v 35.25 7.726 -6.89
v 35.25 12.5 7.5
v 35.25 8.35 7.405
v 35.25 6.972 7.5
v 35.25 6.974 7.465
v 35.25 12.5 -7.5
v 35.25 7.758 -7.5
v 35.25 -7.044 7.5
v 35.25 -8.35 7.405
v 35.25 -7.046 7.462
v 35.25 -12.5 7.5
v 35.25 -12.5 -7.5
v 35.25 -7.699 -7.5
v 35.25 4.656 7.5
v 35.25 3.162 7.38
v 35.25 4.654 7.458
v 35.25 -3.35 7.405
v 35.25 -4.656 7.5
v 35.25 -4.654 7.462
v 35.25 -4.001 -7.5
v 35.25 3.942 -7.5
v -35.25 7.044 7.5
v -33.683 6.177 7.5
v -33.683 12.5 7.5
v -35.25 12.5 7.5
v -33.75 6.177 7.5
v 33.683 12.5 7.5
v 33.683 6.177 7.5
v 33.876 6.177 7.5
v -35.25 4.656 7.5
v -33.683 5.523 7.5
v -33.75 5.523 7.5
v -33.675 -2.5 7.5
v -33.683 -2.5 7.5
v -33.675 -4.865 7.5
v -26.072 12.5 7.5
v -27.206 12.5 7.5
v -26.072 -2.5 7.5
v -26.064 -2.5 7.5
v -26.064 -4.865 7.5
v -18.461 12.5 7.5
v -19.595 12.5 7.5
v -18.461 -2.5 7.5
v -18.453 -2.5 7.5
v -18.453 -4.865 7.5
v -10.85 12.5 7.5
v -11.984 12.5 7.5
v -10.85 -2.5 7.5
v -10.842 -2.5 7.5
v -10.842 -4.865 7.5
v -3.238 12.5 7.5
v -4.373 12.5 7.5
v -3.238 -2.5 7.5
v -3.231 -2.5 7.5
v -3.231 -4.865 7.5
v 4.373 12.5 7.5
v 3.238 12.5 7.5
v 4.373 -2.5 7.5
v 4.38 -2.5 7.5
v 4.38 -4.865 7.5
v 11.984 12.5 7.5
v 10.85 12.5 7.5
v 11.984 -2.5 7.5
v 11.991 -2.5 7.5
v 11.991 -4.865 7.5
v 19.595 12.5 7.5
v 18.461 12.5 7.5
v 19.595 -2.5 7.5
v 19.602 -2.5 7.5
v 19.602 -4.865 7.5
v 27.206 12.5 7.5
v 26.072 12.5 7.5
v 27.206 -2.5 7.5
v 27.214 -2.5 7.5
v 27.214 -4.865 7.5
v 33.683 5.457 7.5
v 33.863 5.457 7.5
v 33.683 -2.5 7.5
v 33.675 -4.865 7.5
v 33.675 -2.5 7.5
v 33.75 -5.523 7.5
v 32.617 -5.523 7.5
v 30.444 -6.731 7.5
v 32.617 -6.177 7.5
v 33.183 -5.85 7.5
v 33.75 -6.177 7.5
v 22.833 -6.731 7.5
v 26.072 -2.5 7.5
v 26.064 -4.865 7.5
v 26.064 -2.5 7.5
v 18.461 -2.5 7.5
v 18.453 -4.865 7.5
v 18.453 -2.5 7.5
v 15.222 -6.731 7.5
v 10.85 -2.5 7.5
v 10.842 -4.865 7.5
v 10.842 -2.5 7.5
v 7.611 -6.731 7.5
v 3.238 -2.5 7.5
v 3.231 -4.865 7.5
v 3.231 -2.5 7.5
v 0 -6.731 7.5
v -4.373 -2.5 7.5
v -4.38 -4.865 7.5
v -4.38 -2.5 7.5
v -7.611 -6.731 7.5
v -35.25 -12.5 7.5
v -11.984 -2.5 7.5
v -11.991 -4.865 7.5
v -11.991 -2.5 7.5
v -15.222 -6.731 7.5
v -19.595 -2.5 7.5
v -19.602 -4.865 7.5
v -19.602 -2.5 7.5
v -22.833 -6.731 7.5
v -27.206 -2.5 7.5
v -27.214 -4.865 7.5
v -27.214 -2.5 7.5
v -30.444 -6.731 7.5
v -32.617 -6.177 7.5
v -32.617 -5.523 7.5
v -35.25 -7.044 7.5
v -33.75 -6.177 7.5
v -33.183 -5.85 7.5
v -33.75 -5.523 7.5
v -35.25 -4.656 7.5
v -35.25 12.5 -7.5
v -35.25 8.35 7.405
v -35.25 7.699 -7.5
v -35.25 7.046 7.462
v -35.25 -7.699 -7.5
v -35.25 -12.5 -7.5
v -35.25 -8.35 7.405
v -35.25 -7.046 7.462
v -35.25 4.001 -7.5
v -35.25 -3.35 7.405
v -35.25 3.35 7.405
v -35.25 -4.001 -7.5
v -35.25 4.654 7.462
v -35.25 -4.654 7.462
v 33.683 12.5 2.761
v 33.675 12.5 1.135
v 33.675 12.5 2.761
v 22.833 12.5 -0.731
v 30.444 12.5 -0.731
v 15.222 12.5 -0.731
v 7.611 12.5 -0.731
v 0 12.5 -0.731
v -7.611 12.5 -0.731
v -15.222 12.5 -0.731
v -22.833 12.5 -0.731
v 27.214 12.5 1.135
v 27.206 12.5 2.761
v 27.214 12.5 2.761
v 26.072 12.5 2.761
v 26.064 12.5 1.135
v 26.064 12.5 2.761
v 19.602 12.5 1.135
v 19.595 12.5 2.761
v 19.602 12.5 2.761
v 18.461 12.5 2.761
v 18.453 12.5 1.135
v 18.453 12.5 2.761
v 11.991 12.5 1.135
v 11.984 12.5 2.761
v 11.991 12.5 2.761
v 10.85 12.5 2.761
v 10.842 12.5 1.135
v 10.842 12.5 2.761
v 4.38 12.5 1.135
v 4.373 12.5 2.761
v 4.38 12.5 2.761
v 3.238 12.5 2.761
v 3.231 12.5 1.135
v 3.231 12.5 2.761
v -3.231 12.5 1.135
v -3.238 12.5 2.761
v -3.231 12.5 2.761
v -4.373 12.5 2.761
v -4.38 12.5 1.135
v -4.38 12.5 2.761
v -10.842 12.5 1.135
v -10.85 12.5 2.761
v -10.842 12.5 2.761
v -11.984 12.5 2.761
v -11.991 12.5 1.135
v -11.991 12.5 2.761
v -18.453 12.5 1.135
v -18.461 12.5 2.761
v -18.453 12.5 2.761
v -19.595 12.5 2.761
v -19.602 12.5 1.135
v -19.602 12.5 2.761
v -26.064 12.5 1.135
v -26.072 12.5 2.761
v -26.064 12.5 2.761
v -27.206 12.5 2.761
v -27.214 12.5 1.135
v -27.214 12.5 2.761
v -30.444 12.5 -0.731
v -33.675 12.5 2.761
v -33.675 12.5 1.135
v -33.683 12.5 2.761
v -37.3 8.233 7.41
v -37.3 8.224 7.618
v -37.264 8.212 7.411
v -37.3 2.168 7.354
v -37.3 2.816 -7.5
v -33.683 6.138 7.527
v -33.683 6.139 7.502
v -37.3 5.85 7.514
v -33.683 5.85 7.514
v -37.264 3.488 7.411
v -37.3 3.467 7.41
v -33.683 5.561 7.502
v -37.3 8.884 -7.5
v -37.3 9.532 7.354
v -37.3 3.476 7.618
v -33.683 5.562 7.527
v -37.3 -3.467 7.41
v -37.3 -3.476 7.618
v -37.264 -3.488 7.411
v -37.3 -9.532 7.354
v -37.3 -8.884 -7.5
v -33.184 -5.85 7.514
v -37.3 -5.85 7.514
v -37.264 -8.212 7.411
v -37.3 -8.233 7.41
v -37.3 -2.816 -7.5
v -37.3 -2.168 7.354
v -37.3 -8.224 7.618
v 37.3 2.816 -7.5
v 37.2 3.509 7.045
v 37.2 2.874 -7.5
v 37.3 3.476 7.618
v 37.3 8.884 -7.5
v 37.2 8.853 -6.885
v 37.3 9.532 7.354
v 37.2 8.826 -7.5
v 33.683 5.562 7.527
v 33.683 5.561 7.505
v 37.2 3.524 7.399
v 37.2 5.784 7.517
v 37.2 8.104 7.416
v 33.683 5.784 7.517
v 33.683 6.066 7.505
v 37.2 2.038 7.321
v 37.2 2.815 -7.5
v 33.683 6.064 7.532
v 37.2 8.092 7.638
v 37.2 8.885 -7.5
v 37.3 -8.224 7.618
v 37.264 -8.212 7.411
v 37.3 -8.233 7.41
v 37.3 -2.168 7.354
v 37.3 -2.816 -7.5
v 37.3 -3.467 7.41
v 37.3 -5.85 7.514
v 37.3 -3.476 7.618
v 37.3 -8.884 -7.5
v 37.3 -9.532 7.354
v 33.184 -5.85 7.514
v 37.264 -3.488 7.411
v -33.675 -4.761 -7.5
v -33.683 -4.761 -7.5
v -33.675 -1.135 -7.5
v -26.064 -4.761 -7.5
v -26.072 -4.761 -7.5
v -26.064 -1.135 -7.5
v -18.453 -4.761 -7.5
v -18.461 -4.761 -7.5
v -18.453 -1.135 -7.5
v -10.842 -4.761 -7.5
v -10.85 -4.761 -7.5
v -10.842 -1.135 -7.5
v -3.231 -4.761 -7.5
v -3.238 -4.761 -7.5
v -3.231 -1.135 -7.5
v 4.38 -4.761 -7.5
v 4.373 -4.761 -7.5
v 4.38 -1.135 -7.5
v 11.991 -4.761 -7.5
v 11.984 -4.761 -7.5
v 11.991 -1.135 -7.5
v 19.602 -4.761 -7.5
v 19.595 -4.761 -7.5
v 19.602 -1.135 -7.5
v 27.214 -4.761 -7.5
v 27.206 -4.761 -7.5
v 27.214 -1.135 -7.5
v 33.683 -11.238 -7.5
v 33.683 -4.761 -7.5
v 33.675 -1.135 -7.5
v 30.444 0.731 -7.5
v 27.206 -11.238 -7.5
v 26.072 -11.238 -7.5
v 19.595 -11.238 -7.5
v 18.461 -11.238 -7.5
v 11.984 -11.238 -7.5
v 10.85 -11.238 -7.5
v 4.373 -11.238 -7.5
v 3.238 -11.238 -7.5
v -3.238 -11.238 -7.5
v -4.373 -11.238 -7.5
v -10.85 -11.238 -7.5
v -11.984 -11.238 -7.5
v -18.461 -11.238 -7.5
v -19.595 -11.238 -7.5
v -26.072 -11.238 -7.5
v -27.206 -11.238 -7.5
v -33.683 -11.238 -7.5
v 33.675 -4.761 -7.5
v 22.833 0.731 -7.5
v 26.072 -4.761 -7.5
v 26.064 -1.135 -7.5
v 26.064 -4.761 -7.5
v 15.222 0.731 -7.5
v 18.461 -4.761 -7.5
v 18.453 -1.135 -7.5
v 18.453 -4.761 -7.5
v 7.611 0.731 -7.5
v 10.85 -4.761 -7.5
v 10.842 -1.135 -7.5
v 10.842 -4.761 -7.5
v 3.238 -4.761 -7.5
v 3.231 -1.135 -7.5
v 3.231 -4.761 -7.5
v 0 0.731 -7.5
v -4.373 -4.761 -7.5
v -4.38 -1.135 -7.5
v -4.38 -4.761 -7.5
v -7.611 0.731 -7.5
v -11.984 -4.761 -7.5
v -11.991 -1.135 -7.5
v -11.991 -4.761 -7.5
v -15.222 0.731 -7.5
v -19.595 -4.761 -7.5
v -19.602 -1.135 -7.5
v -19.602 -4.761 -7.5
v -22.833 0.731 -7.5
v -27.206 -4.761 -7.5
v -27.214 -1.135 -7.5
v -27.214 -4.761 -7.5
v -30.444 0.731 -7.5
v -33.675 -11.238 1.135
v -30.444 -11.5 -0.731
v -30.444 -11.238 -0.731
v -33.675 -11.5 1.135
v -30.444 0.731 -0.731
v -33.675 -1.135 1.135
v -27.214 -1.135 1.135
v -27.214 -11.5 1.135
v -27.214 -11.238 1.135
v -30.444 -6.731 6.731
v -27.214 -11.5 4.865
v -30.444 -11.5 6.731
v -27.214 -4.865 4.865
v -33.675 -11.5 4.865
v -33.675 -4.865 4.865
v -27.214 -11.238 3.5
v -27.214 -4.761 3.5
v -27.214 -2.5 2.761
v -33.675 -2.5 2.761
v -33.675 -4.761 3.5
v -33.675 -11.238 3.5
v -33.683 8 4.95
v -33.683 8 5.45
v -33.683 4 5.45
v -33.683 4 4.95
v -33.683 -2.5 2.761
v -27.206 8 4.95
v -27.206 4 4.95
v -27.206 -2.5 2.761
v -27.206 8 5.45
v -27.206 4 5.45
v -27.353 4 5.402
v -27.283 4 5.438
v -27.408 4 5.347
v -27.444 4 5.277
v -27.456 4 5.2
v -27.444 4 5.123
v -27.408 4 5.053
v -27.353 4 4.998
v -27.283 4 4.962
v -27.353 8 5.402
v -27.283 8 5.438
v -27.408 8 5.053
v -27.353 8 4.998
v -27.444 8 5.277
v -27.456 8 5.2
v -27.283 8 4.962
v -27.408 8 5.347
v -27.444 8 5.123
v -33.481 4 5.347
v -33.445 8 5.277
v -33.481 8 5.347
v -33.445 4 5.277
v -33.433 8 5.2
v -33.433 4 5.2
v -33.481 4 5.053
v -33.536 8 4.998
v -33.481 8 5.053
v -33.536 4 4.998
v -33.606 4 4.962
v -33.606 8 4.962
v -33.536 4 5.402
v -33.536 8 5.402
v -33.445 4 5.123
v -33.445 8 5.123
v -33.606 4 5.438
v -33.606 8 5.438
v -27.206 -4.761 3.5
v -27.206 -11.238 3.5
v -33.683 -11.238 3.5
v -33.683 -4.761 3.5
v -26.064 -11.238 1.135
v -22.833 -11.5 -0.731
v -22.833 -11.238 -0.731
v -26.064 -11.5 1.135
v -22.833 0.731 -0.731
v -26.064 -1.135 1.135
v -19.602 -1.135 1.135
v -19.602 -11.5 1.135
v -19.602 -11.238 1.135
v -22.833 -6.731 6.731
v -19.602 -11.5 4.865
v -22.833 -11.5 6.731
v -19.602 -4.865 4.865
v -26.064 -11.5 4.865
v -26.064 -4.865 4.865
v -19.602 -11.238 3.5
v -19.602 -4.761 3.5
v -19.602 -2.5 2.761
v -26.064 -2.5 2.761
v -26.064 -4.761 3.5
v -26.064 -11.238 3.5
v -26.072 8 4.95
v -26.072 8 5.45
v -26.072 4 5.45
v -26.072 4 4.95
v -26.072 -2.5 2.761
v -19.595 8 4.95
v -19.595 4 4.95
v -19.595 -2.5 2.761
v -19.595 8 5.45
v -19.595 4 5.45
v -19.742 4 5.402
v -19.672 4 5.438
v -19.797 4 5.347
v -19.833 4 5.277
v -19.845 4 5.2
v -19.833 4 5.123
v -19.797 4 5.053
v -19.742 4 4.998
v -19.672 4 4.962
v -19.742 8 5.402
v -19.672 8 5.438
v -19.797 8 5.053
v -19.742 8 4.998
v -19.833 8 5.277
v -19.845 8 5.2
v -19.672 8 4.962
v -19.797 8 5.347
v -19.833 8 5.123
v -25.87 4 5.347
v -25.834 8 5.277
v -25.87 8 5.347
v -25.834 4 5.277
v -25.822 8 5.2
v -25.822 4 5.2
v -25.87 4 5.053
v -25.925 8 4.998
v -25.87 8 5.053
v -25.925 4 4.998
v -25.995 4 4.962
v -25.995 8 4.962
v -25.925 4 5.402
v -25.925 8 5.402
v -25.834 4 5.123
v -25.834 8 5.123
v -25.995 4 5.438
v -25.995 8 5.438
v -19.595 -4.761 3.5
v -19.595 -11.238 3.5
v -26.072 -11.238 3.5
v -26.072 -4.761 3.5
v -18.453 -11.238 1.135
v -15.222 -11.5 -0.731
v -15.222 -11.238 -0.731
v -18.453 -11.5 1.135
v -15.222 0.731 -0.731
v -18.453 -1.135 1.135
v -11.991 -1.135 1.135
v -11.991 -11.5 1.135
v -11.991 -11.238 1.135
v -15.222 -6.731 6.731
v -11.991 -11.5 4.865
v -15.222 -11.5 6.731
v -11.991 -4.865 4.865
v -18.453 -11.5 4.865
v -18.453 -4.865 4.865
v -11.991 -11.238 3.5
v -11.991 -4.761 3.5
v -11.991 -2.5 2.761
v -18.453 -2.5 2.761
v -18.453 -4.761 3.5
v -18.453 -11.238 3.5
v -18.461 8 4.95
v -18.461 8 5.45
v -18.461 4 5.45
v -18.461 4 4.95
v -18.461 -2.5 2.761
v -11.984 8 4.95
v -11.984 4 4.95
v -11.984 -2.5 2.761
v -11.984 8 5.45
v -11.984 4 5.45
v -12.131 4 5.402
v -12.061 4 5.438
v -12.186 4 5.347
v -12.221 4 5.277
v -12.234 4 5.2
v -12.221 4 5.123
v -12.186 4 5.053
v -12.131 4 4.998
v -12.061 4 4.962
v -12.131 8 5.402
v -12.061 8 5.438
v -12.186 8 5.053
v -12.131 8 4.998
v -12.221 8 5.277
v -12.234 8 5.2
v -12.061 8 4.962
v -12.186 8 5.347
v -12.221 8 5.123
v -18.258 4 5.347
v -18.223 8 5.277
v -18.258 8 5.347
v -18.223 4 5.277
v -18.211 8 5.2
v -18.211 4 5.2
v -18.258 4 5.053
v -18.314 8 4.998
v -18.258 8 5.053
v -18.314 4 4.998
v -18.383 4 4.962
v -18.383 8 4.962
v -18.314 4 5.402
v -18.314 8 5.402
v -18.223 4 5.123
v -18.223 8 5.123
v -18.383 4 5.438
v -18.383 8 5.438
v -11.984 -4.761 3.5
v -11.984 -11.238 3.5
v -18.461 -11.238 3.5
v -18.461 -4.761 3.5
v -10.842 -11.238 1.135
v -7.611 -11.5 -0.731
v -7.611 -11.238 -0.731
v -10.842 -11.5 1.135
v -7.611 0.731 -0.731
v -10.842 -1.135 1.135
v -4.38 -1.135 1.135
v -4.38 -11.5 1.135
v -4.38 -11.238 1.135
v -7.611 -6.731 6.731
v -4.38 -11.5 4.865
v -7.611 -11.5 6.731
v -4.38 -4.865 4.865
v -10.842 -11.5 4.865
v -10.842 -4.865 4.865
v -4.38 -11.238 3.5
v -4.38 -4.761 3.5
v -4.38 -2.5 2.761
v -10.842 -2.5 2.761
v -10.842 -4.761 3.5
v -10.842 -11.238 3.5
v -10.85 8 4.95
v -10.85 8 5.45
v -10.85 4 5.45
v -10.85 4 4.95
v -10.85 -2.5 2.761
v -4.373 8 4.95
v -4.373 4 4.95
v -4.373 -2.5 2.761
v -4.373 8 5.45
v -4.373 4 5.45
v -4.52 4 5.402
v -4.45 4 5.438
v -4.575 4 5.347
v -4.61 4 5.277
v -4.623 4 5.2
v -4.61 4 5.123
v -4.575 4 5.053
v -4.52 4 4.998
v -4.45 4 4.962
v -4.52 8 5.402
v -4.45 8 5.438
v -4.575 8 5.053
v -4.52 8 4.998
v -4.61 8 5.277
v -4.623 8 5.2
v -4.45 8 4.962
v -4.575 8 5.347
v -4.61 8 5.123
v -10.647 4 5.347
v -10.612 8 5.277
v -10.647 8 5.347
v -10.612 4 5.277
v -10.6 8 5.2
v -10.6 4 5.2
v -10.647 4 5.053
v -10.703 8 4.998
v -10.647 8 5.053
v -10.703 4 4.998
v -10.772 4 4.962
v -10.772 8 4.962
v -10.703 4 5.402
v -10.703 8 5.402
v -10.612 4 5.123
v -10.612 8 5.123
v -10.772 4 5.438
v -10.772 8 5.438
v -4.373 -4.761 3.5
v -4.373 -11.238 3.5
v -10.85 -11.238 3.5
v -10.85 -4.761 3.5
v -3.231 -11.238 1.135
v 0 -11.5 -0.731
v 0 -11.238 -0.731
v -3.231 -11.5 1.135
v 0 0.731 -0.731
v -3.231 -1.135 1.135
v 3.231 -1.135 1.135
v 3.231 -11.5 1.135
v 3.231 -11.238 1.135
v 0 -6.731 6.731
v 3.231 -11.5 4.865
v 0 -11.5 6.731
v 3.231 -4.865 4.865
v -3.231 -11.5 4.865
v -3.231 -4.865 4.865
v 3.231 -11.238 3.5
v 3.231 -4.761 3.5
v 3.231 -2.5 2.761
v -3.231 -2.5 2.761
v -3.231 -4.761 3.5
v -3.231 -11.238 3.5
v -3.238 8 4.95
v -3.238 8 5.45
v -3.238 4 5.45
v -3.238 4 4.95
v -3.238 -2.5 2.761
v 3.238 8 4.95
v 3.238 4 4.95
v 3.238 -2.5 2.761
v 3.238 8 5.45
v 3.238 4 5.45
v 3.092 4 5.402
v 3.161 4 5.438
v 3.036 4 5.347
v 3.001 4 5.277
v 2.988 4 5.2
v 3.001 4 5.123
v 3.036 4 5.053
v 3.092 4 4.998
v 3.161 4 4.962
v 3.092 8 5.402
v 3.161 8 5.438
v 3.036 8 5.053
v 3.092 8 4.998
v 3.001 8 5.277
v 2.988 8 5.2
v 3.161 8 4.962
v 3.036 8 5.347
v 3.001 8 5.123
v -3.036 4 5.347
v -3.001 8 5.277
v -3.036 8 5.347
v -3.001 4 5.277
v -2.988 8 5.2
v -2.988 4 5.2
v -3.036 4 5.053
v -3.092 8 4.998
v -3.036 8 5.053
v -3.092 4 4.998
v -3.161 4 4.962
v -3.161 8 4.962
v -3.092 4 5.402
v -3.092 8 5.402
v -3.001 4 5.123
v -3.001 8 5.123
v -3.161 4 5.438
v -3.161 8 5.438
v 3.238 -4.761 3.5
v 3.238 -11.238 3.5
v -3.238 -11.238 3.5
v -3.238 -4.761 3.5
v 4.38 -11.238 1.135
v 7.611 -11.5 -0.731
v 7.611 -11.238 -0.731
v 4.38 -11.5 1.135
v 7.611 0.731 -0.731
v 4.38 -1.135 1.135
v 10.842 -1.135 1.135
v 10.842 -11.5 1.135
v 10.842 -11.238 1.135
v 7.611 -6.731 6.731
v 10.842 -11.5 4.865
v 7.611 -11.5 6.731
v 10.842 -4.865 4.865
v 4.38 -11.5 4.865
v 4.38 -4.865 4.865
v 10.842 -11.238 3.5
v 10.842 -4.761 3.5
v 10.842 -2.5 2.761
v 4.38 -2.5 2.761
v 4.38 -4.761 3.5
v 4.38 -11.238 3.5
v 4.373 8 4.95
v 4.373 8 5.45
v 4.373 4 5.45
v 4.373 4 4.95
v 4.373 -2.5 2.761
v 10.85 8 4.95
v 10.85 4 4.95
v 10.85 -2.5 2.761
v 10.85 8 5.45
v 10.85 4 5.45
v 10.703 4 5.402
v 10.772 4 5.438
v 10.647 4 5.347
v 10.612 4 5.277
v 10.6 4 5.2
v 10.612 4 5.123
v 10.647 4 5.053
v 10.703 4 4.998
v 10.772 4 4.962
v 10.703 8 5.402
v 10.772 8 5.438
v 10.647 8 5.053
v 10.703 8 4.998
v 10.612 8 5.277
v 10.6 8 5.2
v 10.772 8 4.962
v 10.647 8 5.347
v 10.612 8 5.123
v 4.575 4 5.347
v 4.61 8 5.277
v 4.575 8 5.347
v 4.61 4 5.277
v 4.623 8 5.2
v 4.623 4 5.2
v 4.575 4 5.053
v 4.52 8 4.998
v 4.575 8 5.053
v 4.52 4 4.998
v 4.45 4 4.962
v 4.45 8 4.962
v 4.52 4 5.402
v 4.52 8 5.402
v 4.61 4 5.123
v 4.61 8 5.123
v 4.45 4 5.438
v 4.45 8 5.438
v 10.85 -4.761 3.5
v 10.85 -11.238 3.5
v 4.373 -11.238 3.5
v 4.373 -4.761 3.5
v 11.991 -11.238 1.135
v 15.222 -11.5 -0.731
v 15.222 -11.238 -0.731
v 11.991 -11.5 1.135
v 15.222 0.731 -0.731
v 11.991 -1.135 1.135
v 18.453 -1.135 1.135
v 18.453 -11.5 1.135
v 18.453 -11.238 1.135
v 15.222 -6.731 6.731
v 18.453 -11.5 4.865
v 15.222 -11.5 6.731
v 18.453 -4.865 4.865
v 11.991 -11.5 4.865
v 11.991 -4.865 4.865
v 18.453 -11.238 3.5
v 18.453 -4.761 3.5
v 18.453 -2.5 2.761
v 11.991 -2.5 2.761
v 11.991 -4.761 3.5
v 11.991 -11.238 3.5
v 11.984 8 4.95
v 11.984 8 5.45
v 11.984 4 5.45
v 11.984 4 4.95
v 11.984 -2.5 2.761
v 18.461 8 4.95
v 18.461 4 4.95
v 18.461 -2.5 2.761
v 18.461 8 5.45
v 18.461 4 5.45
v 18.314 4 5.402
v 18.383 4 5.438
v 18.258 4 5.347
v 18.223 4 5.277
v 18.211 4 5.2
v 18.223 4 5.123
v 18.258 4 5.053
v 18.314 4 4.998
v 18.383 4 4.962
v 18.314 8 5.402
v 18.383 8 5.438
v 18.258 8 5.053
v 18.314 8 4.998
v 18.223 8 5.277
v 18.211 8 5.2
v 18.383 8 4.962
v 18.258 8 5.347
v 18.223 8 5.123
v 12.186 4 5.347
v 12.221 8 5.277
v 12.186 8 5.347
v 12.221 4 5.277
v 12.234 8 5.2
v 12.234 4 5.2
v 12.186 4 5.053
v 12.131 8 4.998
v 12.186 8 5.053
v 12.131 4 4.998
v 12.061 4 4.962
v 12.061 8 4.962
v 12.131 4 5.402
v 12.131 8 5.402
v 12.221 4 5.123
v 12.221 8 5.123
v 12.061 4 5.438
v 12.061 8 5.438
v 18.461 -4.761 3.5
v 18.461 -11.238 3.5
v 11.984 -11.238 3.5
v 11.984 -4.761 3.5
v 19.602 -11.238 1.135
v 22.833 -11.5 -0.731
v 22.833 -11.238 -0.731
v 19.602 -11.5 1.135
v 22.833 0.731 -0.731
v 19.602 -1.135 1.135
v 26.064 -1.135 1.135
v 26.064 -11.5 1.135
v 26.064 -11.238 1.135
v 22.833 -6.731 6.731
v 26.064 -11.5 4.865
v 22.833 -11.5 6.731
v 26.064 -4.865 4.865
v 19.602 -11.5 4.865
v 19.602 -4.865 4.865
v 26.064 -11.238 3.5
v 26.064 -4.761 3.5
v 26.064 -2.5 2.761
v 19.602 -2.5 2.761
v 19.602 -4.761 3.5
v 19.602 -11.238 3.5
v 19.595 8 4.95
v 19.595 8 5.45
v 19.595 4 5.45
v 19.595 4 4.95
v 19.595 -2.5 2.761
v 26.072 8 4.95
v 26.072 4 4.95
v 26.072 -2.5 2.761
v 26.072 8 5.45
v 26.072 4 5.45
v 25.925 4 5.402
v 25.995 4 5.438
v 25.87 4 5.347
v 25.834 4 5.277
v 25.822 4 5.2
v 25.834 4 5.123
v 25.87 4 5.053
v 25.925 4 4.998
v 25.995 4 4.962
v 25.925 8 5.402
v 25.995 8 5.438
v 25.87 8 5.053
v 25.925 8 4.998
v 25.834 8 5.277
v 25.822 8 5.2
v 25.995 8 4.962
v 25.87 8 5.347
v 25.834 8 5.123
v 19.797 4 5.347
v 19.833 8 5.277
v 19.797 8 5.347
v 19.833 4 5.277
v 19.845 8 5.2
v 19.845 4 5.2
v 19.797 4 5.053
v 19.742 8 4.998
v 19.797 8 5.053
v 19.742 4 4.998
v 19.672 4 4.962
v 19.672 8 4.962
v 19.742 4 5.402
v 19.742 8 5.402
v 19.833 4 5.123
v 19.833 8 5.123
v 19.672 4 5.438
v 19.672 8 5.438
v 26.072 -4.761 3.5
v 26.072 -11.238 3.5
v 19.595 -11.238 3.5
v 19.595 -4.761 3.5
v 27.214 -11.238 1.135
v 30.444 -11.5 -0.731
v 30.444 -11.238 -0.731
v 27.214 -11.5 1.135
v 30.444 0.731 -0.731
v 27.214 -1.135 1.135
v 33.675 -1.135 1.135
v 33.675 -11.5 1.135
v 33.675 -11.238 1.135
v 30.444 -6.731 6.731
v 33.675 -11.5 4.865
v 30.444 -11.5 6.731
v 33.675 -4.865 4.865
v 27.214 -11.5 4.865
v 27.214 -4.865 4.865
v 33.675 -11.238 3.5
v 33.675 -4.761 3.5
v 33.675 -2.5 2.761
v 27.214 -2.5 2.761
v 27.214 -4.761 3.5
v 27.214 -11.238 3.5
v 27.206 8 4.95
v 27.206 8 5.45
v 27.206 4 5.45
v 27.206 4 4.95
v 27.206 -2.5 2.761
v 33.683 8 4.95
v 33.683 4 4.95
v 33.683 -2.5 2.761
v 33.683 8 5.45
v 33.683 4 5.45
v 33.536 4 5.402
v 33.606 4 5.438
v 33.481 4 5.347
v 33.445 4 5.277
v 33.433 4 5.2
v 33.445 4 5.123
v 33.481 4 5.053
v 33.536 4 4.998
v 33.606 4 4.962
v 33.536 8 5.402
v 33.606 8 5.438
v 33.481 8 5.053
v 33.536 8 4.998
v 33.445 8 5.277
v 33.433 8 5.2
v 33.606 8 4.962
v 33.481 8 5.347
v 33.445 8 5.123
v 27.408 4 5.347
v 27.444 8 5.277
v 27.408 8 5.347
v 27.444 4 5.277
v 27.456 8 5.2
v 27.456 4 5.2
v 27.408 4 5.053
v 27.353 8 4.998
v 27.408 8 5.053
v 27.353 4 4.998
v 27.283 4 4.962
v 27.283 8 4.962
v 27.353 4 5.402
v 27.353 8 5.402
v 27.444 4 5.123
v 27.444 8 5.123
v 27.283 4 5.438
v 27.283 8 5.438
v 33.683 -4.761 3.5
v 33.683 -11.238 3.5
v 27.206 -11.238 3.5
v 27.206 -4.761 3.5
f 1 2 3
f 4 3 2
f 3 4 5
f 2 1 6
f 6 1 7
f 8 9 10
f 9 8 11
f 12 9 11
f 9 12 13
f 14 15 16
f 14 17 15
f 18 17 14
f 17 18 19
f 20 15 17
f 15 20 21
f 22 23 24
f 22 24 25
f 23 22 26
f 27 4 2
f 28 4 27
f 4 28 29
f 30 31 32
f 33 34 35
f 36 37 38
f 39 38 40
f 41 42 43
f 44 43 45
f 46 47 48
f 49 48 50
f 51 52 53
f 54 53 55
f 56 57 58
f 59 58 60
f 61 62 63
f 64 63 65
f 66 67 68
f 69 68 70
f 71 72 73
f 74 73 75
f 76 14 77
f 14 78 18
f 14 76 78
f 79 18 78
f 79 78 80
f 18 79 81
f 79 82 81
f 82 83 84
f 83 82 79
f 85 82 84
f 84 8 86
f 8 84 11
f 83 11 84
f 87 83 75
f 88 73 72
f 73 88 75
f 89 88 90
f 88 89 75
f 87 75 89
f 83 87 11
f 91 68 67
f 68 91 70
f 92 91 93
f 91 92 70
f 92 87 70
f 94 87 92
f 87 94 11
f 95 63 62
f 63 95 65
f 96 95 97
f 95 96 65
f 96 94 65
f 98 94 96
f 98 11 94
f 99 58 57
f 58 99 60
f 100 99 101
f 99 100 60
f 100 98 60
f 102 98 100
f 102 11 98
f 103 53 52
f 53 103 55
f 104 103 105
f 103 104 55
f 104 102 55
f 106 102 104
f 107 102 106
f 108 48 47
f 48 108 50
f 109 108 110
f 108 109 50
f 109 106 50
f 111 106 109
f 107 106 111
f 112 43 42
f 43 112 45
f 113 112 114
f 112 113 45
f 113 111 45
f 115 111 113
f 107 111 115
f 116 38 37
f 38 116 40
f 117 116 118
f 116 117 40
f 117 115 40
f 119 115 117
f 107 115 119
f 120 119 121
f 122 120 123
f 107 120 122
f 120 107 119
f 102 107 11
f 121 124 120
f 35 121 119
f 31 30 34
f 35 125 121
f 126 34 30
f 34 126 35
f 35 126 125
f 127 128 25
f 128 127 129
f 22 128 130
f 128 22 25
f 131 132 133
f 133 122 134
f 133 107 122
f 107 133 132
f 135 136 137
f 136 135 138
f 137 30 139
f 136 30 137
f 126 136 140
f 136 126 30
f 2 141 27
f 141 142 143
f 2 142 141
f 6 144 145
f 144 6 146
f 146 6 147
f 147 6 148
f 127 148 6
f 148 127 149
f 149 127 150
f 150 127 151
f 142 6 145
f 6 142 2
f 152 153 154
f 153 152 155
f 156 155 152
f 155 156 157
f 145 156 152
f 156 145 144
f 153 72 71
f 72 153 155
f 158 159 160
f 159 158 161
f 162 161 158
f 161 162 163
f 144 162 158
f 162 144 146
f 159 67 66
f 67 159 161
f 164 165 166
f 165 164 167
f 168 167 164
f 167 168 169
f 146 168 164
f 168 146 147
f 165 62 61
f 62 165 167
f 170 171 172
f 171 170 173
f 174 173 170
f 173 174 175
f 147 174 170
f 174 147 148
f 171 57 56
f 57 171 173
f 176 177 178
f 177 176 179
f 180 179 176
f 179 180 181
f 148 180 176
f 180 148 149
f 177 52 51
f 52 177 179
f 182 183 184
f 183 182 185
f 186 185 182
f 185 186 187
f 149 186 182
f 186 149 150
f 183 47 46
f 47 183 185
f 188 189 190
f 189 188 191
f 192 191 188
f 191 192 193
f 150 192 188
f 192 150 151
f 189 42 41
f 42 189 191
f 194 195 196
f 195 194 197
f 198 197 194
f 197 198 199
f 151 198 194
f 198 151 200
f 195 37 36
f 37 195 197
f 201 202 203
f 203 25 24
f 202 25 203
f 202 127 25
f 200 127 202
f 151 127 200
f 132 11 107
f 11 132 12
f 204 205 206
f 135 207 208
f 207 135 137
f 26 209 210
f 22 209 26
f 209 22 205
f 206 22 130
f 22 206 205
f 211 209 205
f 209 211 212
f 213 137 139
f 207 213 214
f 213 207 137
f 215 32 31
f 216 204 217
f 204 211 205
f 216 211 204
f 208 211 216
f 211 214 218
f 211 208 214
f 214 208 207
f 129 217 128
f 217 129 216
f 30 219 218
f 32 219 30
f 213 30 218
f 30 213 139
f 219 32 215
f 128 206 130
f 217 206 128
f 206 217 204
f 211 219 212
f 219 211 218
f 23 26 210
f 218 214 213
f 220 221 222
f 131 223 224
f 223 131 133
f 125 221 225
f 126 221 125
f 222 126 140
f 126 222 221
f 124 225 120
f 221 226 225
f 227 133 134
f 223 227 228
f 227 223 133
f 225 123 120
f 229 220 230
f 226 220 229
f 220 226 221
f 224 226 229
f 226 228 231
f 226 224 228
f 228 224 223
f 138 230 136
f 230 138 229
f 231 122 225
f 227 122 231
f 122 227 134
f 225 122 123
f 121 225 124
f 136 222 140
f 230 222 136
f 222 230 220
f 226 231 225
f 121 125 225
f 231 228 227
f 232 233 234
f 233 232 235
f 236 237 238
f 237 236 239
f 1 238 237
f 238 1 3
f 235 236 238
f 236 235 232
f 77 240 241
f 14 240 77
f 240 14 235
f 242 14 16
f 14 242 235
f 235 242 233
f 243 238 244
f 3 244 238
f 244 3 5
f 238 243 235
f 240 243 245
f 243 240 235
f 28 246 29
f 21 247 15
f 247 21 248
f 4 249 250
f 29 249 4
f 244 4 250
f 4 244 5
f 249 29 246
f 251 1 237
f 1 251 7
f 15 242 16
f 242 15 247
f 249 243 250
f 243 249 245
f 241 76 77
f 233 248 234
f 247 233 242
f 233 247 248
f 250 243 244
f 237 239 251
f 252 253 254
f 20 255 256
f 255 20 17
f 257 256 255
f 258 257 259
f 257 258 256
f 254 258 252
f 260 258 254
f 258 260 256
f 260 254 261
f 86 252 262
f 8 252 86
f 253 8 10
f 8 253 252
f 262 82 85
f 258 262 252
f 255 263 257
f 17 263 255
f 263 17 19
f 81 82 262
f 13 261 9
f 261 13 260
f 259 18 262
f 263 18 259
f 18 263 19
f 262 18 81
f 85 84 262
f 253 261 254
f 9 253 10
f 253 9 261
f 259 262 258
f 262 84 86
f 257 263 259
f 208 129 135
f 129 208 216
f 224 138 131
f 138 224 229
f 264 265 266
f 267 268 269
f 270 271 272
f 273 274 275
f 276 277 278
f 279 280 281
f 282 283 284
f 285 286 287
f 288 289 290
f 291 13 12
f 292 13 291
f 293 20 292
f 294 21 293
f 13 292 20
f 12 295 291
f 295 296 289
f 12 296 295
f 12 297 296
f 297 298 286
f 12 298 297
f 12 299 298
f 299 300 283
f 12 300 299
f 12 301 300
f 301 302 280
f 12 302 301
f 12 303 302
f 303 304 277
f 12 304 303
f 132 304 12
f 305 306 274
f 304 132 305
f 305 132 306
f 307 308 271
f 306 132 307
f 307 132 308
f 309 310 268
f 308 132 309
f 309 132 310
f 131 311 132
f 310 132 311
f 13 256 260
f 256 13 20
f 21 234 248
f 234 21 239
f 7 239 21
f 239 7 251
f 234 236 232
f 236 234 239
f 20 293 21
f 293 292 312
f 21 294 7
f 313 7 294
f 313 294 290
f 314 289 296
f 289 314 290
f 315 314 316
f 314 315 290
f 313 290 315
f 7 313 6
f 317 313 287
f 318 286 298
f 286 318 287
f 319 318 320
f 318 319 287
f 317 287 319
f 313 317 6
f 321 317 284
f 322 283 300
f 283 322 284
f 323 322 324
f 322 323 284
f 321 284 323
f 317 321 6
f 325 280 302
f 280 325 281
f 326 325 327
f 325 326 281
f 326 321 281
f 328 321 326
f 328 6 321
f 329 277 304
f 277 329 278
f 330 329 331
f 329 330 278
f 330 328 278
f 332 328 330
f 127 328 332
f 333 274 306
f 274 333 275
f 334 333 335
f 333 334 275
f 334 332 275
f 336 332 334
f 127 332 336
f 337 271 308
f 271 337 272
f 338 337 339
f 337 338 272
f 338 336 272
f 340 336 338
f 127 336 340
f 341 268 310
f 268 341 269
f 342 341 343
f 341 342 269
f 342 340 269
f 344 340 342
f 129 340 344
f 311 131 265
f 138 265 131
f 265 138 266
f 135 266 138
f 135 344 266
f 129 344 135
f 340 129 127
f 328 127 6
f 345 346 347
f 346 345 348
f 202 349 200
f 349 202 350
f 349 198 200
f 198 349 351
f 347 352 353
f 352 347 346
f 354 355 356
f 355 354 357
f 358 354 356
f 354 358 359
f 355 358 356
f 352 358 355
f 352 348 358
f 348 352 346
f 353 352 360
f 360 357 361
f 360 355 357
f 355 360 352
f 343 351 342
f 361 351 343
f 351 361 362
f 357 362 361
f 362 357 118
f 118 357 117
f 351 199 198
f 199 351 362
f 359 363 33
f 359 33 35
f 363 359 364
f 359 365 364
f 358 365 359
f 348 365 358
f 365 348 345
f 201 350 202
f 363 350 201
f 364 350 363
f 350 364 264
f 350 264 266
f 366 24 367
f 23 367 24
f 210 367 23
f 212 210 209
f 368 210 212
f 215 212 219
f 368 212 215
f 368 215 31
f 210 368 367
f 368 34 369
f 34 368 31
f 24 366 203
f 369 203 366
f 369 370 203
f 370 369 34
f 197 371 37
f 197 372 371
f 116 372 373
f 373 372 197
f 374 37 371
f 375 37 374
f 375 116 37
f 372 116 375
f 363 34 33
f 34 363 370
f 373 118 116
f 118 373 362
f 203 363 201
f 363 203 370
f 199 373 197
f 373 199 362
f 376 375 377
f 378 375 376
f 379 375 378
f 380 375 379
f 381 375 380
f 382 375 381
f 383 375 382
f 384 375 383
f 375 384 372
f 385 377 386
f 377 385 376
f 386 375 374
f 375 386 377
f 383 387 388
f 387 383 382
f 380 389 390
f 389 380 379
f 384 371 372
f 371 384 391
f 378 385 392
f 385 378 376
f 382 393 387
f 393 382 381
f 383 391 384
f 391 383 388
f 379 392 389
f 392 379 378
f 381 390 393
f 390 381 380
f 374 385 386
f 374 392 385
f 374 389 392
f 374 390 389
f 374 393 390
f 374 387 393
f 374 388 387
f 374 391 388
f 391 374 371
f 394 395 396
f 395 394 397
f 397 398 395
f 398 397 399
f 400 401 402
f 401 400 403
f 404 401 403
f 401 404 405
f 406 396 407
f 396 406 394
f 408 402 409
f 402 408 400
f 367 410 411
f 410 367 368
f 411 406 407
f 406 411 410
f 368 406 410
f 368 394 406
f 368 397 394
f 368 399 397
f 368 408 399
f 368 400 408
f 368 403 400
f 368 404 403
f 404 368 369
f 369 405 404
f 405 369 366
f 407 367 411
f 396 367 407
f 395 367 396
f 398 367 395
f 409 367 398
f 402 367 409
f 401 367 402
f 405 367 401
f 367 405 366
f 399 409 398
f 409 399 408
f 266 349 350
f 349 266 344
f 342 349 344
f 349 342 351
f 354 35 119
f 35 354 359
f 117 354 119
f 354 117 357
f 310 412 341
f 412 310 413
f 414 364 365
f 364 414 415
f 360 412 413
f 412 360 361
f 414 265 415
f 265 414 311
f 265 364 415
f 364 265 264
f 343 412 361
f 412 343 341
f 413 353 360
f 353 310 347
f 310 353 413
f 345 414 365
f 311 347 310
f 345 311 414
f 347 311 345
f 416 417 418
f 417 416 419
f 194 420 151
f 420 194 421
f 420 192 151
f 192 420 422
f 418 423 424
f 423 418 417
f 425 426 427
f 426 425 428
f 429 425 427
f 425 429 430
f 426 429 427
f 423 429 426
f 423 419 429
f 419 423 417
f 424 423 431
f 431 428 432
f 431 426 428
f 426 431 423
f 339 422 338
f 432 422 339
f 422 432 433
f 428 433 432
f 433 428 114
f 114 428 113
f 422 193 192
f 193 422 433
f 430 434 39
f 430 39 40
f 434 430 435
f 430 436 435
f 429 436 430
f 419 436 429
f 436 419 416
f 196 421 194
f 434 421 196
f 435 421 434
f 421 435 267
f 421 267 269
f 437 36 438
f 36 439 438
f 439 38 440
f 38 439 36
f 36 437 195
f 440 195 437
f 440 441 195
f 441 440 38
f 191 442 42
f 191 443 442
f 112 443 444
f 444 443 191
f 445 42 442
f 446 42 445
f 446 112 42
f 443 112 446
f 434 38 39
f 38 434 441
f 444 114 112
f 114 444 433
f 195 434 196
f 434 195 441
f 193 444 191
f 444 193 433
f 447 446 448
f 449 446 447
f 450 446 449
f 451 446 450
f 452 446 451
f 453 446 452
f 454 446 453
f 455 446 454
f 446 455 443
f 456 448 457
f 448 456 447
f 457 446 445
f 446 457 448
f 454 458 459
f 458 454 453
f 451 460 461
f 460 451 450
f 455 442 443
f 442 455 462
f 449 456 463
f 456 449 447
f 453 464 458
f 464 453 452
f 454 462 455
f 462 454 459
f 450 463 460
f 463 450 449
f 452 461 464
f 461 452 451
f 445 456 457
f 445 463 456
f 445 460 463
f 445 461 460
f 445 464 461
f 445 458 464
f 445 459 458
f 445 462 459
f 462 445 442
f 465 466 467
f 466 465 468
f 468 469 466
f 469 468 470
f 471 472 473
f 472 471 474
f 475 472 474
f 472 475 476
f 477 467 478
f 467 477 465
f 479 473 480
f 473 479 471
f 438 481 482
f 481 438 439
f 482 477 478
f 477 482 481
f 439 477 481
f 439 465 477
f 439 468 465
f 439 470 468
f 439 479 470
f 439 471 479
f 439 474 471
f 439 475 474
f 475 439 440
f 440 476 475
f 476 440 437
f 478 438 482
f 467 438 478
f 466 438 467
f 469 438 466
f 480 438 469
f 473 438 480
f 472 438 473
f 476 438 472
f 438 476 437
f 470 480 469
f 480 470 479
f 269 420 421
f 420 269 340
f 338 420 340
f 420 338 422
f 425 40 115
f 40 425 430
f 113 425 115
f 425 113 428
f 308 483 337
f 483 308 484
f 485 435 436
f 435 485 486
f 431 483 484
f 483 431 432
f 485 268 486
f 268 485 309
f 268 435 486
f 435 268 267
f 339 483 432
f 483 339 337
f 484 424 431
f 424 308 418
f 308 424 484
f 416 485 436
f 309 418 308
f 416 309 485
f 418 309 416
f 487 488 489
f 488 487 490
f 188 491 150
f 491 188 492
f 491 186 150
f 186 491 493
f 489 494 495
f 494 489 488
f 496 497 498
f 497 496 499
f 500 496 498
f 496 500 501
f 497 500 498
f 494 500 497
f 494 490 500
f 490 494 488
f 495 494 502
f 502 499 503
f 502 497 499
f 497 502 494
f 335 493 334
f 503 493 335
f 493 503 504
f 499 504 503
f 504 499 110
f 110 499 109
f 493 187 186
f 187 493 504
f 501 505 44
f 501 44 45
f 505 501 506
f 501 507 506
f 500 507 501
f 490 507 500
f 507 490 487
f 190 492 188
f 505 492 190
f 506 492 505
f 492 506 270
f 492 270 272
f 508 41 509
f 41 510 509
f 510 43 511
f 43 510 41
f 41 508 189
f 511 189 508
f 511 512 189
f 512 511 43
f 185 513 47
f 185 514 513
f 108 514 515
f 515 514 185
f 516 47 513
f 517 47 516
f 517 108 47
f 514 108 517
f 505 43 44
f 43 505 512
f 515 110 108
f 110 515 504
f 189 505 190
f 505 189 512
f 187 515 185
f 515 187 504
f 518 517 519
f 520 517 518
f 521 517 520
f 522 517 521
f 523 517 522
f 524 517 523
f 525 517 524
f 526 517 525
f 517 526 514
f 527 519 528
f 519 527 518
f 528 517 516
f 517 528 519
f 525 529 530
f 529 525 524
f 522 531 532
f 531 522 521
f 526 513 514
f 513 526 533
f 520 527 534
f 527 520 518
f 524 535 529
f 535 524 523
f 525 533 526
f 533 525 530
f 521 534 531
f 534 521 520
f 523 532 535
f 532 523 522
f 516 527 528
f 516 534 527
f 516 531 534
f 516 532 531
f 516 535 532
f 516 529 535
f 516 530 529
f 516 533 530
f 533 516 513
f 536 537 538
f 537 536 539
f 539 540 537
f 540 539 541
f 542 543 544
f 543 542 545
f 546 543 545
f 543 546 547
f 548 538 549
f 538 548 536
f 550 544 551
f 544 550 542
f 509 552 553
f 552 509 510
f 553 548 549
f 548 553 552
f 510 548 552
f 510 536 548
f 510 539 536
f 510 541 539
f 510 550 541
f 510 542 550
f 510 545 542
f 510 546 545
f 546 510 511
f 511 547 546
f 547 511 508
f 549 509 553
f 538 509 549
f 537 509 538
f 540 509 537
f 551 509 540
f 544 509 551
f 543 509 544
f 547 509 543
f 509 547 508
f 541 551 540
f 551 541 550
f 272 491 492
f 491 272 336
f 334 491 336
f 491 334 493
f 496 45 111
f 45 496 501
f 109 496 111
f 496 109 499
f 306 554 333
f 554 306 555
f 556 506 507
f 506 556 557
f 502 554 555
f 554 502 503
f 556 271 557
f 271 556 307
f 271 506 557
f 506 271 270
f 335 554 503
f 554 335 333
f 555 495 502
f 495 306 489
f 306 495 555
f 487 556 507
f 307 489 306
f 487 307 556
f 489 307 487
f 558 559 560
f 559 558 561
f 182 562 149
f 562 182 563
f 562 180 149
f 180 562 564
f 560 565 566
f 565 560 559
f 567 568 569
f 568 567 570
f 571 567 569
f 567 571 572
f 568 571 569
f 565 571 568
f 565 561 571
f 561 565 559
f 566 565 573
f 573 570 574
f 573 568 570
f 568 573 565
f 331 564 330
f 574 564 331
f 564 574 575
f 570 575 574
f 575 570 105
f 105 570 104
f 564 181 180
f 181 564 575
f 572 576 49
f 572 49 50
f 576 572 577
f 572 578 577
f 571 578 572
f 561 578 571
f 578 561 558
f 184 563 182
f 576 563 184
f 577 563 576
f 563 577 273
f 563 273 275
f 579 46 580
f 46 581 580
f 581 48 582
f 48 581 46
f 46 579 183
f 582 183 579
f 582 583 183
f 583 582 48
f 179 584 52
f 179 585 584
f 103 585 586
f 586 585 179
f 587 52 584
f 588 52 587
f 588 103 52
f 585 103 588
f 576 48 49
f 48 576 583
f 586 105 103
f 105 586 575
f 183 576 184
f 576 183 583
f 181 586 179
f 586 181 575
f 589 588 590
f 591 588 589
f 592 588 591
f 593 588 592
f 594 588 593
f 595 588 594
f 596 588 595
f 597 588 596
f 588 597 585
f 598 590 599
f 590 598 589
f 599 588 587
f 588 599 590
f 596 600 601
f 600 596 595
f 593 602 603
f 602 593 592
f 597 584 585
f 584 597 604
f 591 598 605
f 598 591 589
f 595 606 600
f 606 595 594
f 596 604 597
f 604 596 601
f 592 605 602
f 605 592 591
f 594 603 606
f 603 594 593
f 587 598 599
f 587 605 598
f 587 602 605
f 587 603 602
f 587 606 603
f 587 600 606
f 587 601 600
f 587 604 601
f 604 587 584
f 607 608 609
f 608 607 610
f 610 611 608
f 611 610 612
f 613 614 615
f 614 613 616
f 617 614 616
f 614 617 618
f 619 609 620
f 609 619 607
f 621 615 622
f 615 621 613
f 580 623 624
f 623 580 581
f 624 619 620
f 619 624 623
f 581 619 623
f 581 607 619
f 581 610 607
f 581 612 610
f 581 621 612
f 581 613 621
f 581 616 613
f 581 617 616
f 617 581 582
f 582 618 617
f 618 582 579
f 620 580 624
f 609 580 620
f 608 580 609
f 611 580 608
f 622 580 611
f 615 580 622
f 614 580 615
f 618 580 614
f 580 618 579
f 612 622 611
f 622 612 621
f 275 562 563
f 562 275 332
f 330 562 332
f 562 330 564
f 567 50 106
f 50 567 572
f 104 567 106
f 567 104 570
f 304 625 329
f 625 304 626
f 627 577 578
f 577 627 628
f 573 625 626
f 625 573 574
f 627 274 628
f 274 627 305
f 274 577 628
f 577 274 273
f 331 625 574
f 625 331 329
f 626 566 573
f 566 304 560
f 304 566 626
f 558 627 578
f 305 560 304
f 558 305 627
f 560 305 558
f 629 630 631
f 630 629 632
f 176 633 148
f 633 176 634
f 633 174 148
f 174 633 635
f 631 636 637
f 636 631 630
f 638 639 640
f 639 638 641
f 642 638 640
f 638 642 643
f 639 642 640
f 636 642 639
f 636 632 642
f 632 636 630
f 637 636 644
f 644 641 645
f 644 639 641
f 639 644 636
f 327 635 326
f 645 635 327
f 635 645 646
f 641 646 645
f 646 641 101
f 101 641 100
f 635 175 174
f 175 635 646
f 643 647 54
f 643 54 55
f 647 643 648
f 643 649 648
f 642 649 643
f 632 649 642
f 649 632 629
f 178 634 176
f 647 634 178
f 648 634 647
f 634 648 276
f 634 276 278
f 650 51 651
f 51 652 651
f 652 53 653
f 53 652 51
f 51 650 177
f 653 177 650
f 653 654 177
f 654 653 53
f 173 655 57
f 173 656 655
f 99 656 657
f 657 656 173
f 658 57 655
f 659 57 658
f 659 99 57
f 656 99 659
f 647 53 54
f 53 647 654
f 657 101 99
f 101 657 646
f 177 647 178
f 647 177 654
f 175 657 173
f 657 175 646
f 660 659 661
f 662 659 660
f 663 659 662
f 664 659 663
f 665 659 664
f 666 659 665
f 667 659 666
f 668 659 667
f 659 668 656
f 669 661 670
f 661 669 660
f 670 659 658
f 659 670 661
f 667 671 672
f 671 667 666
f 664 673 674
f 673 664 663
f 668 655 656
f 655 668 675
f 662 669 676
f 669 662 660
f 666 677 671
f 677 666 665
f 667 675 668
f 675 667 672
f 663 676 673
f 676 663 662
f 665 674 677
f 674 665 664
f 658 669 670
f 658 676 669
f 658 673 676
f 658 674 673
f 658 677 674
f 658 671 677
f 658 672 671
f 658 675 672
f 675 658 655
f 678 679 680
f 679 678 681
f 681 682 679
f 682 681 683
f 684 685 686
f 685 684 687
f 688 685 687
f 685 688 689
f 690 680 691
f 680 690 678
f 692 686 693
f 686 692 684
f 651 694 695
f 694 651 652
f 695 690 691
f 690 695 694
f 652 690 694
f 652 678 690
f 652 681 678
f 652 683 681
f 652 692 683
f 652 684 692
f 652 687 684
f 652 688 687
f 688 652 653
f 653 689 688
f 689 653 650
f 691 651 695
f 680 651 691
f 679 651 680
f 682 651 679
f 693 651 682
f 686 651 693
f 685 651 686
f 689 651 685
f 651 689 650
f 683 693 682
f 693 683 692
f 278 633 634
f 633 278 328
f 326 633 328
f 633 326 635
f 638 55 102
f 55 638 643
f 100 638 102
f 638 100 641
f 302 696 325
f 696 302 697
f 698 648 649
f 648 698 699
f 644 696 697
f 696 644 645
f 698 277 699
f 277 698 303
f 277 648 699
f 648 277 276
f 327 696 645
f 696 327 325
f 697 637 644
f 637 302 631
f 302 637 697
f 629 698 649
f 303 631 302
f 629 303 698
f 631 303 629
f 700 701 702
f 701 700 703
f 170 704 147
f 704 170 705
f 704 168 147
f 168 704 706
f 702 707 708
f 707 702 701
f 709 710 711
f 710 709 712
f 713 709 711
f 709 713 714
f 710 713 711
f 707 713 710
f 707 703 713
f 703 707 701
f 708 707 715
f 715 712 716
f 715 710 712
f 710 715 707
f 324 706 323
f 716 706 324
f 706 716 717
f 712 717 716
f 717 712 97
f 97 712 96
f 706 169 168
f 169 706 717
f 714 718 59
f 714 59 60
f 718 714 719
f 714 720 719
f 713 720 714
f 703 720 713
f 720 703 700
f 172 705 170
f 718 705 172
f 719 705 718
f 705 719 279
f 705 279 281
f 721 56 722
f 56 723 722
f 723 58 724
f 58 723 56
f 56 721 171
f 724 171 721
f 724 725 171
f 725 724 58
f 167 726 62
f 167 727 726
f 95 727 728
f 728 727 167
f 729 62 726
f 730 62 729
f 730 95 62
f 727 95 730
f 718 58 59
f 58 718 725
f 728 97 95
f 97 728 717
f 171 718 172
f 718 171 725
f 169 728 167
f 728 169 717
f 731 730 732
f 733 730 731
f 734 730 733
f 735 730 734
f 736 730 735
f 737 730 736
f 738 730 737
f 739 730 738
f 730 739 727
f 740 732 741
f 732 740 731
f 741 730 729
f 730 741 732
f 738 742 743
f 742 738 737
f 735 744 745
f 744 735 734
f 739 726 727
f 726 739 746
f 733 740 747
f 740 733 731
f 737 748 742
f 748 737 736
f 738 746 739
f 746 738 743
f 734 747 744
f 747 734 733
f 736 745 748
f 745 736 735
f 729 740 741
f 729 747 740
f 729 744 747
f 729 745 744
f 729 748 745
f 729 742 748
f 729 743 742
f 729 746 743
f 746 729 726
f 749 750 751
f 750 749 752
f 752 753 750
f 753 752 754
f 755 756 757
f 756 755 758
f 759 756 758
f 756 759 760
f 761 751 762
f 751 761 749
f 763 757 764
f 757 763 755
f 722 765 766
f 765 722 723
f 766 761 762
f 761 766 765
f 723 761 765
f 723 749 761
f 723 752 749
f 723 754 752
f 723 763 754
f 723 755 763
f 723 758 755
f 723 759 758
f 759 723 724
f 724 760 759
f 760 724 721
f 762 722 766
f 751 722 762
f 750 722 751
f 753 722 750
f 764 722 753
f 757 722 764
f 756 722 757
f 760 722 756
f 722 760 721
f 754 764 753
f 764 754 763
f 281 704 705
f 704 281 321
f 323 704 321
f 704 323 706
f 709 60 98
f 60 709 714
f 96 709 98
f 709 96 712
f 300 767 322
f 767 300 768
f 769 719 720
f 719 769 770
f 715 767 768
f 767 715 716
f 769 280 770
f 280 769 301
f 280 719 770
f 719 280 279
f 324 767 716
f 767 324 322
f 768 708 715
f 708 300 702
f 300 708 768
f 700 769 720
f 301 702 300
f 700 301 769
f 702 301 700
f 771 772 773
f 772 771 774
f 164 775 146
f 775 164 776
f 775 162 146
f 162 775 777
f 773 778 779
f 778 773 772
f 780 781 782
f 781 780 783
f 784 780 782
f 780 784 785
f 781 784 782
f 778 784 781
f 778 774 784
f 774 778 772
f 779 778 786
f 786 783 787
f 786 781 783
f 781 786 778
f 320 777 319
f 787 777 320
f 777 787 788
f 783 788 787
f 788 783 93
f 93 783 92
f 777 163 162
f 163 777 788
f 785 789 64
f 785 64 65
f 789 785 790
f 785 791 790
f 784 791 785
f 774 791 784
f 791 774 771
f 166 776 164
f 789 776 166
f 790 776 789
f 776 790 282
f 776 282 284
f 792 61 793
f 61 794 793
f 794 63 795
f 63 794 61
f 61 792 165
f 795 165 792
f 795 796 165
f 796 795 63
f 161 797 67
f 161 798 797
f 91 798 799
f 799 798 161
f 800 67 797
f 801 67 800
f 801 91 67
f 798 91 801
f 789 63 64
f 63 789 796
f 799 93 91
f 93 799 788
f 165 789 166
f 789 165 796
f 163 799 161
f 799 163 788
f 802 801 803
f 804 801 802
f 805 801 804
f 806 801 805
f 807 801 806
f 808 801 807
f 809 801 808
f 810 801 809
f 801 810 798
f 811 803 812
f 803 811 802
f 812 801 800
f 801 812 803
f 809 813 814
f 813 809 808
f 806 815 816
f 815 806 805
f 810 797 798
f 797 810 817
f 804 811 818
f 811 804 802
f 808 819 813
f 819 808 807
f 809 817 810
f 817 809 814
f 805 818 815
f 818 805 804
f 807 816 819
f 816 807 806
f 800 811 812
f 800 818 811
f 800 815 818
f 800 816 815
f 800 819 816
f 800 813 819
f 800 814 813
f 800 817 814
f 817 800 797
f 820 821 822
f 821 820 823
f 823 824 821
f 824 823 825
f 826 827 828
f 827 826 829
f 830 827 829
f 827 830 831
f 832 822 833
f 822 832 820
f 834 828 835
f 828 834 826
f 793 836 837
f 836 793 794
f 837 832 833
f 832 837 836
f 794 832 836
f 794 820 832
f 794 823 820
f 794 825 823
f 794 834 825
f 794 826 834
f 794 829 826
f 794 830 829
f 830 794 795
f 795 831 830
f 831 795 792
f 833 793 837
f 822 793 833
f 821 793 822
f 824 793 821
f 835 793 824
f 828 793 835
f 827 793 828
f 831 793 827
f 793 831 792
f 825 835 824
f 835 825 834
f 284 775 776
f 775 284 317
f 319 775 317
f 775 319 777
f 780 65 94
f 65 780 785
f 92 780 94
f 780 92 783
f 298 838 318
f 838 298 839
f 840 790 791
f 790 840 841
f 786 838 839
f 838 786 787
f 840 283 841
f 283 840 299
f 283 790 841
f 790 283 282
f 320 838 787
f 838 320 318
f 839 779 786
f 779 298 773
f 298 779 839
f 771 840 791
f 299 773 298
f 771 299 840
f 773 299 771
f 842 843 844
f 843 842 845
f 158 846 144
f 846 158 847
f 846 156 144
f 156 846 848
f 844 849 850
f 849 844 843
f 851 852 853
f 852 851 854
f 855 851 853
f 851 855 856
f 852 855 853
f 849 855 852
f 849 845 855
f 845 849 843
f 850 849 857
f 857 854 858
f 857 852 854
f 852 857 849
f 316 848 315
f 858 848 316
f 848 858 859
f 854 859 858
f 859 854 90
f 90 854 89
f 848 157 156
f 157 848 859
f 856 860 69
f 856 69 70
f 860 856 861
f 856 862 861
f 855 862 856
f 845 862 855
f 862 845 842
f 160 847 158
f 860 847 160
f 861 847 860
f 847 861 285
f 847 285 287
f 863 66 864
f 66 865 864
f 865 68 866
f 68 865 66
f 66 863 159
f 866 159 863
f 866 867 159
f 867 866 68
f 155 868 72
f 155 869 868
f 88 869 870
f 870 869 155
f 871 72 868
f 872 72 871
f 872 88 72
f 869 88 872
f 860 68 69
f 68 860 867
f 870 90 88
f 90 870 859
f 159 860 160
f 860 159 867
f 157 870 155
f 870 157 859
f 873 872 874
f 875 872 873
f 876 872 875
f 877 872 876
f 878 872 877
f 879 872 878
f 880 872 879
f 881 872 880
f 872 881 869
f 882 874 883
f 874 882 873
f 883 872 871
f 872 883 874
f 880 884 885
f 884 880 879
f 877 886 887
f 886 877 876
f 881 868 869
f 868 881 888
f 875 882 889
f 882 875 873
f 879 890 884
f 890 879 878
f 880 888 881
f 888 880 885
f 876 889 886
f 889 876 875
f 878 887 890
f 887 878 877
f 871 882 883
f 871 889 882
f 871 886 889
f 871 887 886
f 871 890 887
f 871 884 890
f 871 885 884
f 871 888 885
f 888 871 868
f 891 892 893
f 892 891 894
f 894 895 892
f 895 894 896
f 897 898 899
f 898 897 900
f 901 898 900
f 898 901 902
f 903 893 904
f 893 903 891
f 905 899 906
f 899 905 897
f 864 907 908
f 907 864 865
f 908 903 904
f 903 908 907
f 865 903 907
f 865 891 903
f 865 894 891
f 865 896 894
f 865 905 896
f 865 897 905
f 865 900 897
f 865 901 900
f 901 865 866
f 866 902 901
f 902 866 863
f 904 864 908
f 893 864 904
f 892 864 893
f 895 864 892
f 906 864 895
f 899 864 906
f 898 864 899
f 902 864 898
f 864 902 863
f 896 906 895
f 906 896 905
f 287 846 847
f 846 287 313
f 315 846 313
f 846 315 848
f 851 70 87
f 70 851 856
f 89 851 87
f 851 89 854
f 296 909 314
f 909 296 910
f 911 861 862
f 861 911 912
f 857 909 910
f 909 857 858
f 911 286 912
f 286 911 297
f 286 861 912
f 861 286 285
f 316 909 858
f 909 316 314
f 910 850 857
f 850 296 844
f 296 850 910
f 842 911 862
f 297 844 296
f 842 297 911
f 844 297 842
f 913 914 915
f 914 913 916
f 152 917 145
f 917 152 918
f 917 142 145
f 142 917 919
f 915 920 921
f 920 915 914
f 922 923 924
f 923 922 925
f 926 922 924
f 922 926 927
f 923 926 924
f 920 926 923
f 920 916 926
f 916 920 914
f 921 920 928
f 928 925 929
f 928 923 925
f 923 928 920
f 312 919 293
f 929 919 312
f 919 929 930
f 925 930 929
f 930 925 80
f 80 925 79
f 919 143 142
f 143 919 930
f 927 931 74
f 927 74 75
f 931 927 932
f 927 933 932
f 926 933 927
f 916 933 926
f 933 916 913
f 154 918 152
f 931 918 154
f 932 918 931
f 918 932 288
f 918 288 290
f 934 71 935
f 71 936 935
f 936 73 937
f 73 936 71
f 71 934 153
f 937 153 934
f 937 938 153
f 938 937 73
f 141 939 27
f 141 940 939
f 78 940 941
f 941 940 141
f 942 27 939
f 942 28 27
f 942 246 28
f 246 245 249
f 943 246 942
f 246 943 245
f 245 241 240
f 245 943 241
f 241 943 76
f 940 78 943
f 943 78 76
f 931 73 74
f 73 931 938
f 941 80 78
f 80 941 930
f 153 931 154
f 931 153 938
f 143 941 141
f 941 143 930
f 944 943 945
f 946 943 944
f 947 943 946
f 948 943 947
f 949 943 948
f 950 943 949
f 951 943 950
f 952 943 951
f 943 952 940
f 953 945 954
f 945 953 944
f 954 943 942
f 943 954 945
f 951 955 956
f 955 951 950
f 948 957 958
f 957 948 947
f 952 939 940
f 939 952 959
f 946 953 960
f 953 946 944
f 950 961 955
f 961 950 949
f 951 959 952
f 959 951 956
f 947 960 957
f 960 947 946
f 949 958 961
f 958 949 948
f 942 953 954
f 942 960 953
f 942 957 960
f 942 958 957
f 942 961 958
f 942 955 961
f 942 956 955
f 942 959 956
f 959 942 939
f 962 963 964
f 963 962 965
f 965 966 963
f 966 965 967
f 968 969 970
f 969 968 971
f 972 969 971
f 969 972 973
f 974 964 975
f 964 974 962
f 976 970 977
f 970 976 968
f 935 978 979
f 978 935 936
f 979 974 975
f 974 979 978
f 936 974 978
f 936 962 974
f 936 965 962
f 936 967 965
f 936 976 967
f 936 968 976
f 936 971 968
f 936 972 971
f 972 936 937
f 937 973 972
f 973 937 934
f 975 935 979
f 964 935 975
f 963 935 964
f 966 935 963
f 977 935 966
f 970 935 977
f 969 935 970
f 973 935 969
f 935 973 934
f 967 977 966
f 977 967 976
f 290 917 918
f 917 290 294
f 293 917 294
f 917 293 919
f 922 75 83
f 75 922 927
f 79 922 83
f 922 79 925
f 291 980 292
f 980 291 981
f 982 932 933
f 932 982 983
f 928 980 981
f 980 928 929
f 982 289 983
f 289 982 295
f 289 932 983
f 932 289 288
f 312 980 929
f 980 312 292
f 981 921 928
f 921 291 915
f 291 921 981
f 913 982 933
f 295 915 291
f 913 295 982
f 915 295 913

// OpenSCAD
/************** BEST VIEWED IN A CODE EDITOR 80 COLUMNS WIDE *******************
*
* Dewalt ToughCase Bit Holders
* Benjamen Johnson <workshop.electronsmith.com>
* 20190925
* Version 6
* openSCAD Version: 2015.03-2
*******************************************************************************/
/* [Simple] */
// number of bit slots
num_slots= 9;

// Adjust the fit of the bits in the slots
fudge = 1.02;

/* [Expert] */
/*******************************************************************************
*      -----------------------------------   ------
*    \|                                   |/    |
*    /|                                   |\    |
*     |                                   |   width
*    \|                                   |/    | 
*    /|                                   |\    |
*      -----------------------------------   ------
*     |   <--------- length ---------->   |
*
*      -------------  -----    
*     |  :::   :::  |   |
*     |  :::   :::  |   |
*     |  :::   :::  | depth
*     |  :::   :::  |   | 
*     |  :::   :::  |   |
*      -------------  -----
*     | <- width -> | 
*
* Note: The dovetails are represented by colons. I'm ignoring that the
*       dovetails change in width for this diagram to make it simpler
*******************************************************************************/
// Length of insert not counting the dovetails (x direction)
width = 70.5;

// Width of insert (y direction)
height = 25;

// Depth of insert from the bottom of the case up(z direction)
depth = 15;

/*******************************************************************************
*    ---------   ---------  ---
*    \       /   \       /   |
*     \     /     \     /   dovetail_offset (offset from standard, not distance)
*      \   /       \   /     |
*    ---------------------- ---
*        | <--- ---> | -- dovetail_distance
*  --------------------------
*  |  :       :   :       :  |
*  |  :       :   :       :  | |   /
*  |   :     :     :     :   | |  /  <- dovetail_angle: the dovetails are wider
*  |   :     :     :     :   | | /      at the top than the bottom. They are 
*  |    :   :       :   :    | |/       defined by the with of the bottom and 
*  |    :   :       :   :    |          the angle.
*   ------------------------- 
*       |< >| -- dovetail_width_bottom
*
*******************************************************************************/
// distance between the dovetails
dovetail_distance = 11.7;

// width of the bottom part of the dovetail
dovetail_width_bottom = 7;

// the taper angle of the dovetails (bottom narrower than top)
dovetail_angle = 2.5;

// an adjustment for moving the dovetails in or out
dovetail_offset = 0.3;

//Add a small amount to cut peices to make the engine render properly
render_offset = 0.05;

/*[hidden]*/

//inches to mm conversion
in_to_mm = 25.4;

//bit size
bit_dia_points =.288*in_to_mm*fudge;
bit_dia_flats = .25*in_to_mm*fudge;

difference(){
    translate([0,0,-depth/2])difference(){
        union(){
            //Create main body
            cube([width,height,depth*2],center=true);
            
            //Create dovetails
            translate([-width/2-dovetail_offset,dovetail_distance/2,0])rotate([dovetail_angle,0,0])cylinder(d=dovetail_width_bottom,h=depth*2,center=true,$fn=3);
            translate([-width/2-dovetail_offset,dovetail_distance/2,0])rotate([-dovetail_angle,0,0])cylinder(d=dovetail_width_bottom,h=depth*2,center=true,$fn=3);
            
            translate([-width/2-dovetail_offset,-dovetail_distance/2,0])rotate([dovetail_angle,0,0])cylinder(d=dovetail_width_bottom,h=depth*2,center=true,$fn=3);
            translate([-width/2-dovetail_offset,-dovetail_distance/2,0])rotate([-dovetail_angle,0,0])cylinder(d=dovetail_width_bottom,h=depth*2,center=true,$fn=3);
            
            translate([width/2+dovetail_offset,dovetail_distance/2,0])rotate([dovetail_angle,0,180])cylinder(d=dovetail_width_bottom,h=depth*2,center=true,$fn=3);
            translate([width/2+0.2,dovetail_distance/2,0])rotate([-3,0,180])cylinder(d=dovetail_width_bottom,h=depth*2,center=true,$fn=3);
            
            translate([width/2+dovetail_offset,-dovetail_distance/2,0])rotate([dovetail_angle,0,180])cylinder(d=dovetail_width_bottom,h=depth*2,center=true,$fn=3);
            translate([width/2+dovetail_offset,-dovetail_distance/2,0])rotate([-dovetail_angle,0,180])cylinder(d=dovetail_width_bottom,h=depth*2,center=true,$fn=3);
        } // end union
        
        // cut off bottom of holder
        translate([0,0,-(depth+10)/2]) cube([width+10,height+render_offset,depth+10],center=true);
    } //end difference
    
    min_edge = 1;
    width2= width - 2 * min_edge;
    step = width2 /(num_slots);
    start = -width2/2+step/2;
    end = width2/2;
        
    for (x=[start:step:end]){
        translate([x,0,0])BitHolder();
    } //end for
} //end difference

module BitHolder(){
    
    difference(){
        union(){
            // horizontal hole
            translate([0,1,3])rotate([90,30,0])cylinder(d=bit_dia_points, h=height, center=true,$fn=6);
            translate([0,10,6])rotate([90,0,0])cube([bit_dia_flats,bit_dia_flats,height], center=true);
        }// end union
        
        // keepers
        translate([bit_dia_flats/2,6,5.2])rotate([90,0,0])cylinder(d=0.5,h=4, center=true,$fn=20);
        translate([-bit_dia_flats/2,6,5.2])rotate([90,0,0])cylinder(d=0.5,h=4, center=true,$fn=20);
        } // end difference
    
    // vertical hole
    translate([0,-3,0])rotate([0,0,30])cylinder(d=bit_dia_points, h=depth+render_offset, center=true,$fn=6);
    translate([0,-8,-4])cube([bit_dia_flats,bit_dia_flats,depth], center=true);
}
